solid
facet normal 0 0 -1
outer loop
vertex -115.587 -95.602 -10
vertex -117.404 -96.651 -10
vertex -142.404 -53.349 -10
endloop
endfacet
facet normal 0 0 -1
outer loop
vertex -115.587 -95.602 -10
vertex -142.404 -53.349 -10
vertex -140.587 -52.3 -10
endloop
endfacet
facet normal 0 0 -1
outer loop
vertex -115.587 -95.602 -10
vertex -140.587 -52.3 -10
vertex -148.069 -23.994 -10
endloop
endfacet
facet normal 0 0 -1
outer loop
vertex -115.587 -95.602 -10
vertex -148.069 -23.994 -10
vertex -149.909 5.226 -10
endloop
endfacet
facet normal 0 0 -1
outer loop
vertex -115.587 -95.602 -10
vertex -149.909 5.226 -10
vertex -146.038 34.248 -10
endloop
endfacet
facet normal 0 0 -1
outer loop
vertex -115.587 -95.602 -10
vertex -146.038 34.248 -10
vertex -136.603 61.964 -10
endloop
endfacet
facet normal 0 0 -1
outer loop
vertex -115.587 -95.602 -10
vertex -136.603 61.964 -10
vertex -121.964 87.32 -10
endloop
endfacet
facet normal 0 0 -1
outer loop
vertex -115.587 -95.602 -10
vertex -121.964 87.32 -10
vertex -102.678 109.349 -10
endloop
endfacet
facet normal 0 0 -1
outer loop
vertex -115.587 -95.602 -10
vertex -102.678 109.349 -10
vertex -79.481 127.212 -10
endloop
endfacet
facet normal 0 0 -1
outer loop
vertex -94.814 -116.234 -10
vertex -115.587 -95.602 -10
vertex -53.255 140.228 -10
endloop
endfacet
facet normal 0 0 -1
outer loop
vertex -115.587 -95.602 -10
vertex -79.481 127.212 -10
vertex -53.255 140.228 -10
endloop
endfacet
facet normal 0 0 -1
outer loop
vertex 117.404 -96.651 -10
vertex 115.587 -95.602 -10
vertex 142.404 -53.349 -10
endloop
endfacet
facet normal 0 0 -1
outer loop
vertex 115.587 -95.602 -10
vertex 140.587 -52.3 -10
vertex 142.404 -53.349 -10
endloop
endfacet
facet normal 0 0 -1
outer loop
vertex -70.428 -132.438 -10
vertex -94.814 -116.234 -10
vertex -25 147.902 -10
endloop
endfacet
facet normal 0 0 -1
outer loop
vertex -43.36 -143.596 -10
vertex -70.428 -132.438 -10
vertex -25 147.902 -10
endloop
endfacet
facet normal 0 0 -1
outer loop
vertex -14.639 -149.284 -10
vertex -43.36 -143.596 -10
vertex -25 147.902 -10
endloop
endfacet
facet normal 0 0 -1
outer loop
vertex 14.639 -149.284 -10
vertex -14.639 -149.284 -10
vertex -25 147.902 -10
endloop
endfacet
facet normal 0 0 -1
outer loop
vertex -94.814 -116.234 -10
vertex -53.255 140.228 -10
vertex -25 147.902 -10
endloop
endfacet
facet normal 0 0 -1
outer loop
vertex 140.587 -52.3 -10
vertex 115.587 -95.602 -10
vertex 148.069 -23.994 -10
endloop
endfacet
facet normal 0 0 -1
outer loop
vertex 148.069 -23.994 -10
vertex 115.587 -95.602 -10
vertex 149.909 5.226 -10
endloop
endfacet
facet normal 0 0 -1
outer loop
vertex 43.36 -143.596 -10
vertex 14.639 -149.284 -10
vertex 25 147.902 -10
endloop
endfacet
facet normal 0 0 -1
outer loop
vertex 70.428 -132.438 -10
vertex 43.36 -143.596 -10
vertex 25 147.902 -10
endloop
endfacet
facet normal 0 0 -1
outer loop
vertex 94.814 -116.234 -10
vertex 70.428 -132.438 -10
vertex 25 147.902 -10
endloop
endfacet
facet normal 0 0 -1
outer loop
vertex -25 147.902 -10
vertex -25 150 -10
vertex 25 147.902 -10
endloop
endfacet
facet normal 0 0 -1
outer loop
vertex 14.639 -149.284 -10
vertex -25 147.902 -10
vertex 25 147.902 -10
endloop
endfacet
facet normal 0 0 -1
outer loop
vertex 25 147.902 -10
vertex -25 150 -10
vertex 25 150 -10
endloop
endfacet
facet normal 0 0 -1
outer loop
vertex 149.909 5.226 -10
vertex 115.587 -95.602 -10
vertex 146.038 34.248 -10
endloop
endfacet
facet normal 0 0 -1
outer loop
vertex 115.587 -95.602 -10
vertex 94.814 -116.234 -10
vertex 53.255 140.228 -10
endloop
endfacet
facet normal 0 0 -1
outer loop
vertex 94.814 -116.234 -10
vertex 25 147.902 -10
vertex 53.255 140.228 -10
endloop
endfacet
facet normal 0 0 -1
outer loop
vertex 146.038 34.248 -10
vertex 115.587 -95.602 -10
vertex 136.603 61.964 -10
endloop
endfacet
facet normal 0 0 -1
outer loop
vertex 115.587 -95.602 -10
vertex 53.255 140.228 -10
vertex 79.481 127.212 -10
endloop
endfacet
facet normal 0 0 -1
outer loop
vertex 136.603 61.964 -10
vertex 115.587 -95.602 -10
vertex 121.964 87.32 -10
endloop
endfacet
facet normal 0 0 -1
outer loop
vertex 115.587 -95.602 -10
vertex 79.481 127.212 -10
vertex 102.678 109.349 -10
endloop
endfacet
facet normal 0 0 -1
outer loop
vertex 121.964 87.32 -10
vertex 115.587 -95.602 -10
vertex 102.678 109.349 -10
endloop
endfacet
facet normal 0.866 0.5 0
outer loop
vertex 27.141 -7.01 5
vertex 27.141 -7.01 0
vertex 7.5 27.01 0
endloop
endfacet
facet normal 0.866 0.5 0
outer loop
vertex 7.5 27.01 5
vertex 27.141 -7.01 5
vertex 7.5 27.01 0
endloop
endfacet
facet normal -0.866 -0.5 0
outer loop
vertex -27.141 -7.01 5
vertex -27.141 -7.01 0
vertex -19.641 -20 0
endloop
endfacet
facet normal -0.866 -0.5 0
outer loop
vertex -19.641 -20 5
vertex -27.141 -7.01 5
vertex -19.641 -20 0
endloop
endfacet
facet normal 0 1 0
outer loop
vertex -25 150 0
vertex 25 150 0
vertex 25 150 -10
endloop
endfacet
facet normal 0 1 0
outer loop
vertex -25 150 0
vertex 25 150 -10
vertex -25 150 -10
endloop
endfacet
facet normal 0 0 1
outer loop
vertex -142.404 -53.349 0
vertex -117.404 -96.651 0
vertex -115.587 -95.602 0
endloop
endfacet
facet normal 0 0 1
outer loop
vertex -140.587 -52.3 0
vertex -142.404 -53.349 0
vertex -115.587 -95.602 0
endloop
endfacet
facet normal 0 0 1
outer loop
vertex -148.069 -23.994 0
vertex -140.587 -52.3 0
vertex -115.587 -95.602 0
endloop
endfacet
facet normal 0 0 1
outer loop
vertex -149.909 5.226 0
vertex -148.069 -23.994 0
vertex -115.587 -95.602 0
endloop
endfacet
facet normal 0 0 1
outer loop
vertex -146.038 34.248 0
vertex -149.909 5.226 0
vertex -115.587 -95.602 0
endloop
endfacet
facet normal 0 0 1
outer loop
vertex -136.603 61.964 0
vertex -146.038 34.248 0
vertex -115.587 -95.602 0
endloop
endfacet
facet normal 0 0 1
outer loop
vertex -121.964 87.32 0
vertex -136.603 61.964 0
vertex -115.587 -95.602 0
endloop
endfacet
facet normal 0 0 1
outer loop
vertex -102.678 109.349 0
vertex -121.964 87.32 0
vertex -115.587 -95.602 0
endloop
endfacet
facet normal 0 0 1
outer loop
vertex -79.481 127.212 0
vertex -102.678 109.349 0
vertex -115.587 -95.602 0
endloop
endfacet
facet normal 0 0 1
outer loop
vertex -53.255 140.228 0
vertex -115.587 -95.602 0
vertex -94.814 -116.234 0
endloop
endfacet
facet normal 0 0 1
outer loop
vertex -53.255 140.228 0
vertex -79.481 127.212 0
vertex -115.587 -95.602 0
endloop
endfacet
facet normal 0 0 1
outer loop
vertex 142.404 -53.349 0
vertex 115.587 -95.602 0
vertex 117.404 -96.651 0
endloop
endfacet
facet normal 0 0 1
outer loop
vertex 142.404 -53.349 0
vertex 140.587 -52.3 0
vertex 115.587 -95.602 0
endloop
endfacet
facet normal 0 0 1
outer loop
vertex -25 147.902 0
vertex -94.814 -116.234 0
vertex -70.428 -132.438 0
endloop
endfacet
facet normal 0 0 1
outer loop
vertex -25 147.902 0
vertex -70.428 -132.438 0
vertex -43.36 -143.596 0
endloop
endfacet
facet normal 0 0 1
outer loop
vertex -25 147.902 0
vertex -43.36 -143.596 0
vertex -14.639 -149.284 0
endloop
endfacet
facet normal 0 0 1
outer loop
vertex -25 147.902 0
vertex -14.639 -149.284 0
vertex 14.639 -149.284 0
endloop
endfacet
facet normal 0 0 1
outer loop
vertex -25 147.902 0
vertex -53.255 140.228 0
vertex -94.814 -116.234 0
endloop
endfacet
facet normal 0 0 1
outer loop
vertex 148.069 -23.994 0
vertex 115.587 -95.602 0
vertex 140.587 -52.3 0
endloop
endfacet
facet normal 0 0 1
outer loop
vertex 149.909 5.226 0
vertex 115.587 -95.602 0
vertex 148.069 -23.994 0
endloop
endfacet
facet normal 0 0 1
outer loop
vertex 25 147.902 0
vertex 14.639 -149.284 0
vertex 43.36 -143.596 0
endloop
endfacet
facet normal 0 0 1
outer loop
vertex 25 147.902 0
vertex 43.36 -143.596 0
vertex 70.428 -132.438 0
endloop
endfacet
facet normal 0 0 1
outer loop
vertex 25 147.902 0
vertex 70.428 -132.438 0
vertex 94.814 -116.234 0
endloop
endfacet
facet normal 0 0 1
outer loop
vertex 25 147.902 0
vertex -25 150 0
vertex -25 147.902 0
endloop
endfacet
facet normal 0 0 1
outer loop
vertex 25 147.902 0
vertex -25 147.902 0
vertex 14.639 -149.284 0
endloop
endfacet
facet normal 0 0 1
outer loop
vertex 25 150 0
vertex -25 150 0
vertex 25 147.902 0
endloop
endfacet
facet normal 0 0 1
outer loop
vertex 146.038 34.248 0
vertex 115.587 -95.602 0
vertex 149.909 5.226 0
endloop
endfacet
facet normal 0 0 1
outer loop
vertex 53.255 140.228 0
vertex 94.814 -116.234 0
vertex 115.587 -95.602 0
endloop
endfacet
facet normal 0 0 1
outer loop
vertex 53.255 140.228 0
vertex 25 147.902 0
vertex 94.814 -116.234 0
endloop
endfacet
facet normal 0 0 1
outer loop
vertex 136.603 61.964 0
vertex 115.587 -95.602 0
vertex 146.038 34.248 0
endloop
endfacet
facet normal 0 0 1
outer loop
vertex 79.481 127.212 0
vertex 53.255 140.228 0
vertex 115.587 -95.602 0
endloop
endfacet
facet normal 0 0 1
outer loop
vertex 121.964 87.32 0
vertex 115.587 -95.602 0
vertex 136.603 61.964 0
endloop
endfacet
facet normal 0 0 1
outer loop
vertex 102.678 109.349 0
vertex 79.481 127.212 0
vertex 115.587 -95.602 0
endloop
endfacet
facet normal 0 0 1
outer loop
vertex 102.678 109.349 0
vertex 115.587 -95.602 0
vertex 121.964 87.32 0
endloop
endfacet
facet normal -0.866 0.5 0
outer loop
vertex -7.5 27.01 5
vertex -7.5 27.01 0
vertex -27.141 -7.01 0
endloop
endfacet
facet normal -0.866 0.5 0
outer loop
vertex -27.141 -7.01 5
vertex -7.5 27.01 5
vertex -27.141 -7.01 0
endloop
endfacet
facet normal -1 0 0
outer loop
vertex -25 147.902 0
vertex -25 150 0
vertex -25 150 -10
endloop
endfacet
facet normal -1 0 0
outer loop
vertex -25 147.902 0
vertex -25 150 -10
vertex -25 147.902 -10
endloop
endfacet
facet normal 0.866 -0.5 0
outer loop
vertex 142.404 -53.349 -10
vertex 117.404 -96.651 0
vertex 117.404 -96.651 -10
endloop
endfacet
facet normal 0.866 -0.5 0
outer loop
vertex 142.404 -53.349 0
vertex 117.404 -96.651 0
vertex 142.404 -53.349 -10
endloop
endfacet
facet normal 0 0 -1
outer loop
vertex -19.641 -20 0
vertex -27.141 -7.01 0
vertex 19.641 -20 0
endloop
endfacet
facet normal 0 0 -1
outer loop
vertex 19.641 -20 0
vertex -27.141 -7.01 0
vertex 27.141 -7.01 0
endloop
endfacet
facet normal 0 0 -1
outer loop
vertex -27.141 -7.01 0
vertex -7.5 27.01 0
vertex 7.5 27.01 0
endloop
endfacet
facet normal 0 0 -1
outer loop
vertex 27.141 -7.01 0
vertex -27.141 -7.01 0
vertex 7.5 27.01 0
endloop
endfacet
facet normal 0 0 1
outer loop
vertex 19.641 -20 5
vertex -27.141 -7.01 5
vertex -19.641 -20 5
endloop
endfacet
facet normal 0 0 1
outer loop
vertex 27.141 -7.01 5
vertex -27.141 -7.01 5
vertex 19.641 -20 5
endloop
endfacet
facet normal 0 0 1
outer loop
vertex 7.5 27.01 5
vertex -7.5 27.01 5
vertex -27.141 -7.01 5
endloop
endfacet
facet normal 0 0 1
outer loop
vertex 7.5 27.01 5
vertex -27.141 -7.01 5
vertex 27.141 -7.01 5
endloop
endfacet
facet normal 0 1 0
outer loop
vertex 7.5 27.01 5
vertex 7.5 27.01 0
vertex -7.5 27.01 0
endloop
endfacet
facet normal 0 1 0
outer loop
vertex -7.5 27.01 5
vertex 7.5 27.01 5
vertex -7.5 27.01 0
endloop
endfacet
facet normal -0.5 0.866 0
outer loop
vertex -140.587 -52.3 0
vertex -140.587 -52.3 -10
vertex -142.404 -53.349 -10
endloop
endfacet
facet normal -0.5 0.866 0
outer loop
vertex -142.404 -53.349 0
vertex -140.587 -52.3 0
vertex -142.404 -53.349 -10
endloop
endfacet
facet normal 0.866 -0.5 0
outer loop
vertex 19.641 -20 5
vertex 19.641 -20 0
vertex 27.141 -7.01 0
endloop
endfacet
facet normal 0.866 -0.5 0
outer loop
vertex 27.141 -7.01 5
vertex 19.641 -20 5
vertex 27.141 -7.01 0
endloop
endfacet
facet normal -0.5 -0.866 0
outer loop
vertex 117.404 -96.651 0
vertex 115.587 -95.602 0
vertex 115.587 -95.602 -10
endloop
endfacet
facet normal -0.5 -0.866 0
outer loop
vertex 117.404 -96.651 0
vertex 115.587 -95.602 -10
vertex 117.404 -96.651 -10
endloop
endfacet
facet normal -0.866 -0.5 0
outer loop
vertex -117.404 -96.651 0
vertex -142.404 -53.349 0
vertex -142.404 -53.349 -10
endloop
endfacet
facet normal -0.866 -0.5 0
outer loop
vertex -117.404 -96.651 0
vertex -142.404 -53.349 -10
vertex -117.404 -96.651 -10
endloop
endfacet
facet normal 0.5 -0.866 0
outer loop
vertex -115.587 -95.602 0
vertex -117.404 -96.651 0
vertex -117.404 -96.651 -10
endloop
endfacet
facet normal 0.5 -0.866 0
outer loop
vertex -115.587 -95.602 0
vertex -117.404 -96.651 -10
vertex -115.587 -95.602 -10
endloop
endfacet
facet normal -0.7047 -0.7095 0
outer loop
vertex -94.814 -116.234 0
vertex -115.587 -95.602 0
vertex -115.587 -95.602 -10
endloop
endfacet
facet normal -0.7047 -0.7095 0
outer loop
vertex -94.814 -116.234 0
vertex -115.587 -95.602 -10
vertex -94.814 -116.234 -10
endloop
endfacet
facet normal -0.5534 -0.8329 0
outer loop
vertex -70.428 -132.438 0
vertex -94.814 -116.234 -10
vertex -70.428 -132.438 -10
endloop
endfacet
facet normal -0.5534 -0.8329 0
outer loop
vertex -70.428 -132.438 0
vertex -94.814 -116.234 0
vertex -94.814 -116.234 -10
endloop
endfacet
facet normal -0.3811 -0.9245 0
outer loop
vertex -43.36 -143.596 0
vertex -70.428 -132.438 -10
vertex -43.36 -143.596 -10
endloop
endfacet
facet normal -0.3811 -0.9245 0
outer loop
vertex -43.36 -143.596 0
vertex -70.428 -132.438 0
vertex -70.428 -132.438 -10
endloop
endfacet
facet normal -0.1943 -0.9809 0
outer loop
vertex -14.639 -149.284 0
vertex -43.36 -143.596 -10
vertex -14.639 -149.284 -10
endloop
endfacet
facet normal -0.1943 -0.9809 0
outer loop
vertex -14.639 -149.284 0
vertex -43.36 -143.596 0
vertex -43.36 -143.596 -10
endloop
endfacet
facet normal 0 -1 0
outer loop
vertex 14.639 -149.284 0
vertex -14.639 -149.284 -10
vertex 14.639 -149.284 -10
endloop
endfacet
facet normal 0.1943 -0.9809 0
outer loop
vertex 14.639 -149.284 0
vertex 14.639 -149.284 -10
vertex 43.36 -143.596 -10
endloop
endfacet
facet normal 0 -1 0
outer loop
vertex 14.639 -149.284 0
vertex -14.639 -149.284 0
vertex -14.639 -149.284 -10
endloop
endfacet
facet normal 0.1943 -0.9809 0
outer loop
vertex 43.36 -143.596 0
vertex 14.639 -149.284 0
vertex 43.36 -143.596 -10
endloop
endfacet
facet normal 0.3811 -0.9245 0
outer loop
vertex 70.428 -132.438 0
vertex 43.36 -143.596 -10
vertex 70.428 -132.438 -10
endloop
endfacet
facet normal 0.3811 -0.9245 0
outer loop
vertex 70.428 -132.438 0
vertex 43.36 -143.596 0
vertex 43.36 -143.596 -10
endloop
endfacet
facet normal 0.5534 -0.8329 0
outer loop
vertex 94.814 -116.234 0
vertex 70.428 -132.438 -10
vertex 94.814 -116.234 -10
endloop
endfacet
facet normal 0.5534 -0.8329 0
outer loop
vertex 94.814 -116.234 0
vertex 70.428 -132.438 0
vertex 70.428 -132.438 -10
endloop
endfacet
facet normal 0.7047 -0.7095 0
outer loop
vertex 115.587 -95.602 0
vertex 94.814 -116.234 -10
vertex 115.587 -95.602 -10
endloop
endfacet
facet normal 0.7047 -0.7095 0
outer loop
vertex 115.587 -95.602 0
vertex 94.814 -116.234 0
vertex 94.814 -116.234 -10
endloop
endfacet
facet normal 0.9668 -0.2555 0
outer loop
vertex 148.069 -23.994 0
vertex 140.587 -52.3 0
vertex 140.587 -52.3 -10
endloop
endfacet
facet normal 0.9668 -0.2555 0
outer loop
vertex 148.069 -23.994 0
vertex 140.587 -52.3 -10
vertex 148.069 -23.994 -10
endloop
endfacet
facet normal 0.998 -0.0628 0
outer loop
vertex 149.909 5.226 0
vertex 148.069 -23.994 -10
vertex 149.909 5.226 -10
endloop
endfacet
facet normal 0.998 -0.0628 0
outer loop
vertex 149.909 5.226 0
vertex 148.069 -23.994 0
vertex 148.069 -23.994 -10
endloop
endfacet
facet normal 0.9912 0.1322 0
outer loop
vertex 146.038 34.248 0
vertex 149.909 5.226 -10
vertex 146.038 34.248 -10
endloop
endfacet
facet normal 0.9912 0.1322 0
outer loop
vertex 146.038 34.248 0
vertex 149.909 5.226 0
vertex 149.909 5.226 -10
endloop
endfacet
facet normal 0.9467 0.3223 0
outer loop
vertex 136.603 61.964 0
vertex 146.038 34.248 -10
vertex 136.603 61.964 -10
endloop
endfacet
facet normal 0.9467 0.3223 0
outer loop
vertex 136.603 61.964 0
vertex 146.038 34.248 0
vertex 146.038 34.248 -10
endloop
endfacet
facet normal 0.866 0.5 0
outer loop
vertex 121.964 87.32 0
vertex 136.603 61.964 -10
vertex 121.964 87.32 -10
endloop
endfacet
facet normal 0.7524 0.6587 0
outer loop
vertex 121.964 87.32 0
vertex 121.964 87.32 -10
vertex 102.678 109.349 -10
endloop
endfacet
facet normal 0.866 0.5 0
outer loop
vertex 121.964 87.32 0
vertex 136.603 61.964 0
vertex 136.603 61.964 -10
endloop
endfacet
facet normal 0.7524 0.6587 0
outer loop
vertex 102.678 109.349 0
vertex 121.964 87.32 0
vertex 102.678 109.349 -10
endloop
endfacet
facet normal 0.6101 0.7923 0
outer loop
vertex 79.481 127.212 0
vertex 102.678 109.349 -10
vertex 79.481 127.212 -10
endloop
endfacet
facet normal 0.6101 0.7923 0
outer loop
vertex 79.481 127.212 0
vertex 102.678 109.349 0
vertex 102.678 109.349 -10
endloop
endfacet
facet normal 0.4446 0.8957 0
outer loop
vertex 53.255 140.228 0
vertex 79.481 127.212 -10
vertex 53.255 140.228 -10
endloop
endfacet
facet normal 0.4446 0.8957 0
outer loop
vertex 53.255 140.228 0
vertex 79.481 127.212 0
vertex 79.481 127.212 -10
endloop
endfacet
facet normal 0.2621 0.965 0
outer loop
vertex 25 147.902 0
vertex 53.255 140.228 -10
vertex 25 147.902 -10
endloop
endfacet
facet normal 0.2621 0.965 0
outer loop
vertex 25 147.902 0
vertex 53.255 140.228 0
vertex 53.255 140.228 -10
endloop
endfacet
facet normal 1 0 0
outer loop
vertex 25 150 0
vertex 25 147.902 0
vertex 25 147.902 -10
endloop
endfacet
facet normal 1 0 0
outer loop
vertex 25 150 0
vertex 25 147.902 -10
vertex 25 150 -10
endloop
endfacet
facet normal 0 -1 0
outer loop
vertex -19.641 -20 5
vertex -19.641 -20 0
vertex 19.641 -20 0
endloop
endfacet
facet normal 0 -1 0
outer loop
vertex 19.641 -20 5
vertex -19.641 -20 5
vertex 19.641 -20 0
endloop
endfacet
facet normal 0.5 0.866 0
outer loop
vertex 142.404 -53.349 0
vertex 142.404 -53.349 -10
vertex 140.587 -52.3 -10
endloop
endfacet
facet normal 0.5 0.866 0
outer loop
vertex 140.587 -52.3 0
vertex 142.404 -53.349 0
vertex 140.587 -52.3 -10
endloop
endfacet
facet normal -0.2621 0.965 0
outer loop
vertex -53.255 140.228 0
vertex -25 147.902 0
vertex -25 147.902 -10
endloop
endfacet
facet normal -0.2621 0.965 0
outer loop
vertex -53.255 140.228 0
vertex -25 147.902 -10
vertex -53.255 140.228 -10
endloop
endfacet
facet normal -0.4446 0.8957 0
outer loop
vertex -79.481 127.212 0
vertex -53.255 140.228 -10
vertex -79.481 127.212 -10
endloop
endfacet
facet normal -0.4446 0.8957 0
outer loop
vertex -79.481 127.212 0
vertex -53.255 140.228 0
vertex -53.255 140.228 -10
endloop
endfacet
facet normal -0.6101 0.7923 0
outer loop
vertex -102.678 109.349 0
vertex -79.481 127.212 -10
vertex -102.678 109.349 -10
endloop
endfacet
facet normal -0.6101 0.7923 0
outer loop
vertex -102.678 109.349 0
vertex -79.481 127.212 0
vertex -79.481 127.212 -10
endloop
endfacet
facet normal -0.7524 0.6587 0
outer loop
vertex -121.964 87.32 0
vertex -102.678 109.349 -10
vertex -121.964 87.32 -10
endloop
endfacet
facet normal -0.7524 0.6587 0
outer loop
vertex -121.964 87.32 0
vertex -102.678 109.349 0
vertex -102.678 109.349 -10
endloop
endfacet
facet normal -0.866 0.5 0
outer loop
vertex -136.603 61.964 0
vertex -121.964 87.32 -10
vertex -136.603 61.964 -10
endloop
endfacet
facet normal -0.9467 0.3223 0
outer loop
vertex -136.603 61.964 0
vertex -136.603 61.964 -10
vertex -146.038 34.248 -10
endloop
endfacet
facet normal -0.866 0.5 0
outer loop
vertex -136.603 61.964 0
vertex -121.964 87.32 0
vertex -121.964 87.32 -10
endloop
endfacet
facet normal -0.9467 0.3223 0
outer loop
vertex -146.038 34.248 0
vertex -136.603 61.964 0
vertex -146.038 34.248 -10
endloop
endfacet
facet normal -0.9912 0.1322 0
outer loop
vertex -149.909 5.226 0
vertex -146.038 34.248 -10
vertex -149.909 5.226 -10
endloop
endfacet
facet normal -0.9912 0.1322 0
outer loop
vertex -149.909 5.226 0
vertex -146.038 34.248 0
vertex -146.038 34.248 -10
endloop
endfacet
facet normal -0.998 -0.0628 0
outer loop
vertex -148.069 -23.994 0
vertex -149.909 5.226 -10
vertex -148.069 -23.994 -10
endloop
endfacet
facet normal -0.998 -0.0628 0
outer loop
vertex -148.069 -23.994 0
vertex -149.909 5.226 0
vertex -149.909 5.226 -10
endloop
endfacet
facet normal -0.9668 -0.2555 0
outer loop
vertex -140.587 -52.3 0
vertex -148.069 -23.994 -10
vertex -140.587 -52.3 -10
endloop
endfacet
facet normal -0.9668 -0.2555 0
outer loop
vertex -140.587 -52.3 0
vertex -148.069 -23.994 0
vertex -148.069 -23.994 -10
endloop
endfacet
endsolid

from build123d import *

# Parameters (mm, degrees)
F1_DEPTH = 10
F3_DEPTH = 5


with BuildPart() as f1:
    # F0 (on Top) → F1 (new body)
    with BuildSketch(Plane.XY):
        with BuildLine():
            Line((-117.403811, -96.650635), (-115.586885, -95.601632))
            ThreePointArc((-115.586885, -95.601632), (0, -150), (115.586885, -95.601632))
            Line((115.586885, -95.601632), (117.403811, -96.650635))
            Line((117.403811, -96.650635), (129.903811, -75))
            Line((129.903811, -75), (142.403811, -53.349365))
            Line((142.403811, -53.349365), (140.586885, -52.300362))
            ThreePointArc((140.586885, -52.300362), (129.903811, 75), (25, 147.901995))
            Line((25, 147.901995), (25, 150))
            Line((25, 150), (0, 150))
            Line((0, 150), (-25, 150))
            Line((-25, 150), (-25, 147.901995))
            ThreePointArc((-25, 147.901995), (-129.903811, 75), (-140.586885, -52.300362))
            Line((-140.586885, -52.300362), (-142.403811, -53.349365))
            Line((-142.403811, -53.349365), (-129.903811, -75))
            Line((-129.903811, -75), (-117.403811, -96.650635))
        make_face()
    extrude(amount=-F1_DEPTH)


with BuildPart() as f3:
    # F2 (on Top) → F3 (new body)
    with BuildSketch(Plane.XY):
        Polygon((27.141016, -7.009619), (7.5, 27.009619), (-7.5, 27.009619), (-27.141016, -7.009619), (-19.641016, -20), (19.641016, -20), align=None)
    extrude(amount=F3_DEPTH)


solid = Compound([f1.part, f3.part])
